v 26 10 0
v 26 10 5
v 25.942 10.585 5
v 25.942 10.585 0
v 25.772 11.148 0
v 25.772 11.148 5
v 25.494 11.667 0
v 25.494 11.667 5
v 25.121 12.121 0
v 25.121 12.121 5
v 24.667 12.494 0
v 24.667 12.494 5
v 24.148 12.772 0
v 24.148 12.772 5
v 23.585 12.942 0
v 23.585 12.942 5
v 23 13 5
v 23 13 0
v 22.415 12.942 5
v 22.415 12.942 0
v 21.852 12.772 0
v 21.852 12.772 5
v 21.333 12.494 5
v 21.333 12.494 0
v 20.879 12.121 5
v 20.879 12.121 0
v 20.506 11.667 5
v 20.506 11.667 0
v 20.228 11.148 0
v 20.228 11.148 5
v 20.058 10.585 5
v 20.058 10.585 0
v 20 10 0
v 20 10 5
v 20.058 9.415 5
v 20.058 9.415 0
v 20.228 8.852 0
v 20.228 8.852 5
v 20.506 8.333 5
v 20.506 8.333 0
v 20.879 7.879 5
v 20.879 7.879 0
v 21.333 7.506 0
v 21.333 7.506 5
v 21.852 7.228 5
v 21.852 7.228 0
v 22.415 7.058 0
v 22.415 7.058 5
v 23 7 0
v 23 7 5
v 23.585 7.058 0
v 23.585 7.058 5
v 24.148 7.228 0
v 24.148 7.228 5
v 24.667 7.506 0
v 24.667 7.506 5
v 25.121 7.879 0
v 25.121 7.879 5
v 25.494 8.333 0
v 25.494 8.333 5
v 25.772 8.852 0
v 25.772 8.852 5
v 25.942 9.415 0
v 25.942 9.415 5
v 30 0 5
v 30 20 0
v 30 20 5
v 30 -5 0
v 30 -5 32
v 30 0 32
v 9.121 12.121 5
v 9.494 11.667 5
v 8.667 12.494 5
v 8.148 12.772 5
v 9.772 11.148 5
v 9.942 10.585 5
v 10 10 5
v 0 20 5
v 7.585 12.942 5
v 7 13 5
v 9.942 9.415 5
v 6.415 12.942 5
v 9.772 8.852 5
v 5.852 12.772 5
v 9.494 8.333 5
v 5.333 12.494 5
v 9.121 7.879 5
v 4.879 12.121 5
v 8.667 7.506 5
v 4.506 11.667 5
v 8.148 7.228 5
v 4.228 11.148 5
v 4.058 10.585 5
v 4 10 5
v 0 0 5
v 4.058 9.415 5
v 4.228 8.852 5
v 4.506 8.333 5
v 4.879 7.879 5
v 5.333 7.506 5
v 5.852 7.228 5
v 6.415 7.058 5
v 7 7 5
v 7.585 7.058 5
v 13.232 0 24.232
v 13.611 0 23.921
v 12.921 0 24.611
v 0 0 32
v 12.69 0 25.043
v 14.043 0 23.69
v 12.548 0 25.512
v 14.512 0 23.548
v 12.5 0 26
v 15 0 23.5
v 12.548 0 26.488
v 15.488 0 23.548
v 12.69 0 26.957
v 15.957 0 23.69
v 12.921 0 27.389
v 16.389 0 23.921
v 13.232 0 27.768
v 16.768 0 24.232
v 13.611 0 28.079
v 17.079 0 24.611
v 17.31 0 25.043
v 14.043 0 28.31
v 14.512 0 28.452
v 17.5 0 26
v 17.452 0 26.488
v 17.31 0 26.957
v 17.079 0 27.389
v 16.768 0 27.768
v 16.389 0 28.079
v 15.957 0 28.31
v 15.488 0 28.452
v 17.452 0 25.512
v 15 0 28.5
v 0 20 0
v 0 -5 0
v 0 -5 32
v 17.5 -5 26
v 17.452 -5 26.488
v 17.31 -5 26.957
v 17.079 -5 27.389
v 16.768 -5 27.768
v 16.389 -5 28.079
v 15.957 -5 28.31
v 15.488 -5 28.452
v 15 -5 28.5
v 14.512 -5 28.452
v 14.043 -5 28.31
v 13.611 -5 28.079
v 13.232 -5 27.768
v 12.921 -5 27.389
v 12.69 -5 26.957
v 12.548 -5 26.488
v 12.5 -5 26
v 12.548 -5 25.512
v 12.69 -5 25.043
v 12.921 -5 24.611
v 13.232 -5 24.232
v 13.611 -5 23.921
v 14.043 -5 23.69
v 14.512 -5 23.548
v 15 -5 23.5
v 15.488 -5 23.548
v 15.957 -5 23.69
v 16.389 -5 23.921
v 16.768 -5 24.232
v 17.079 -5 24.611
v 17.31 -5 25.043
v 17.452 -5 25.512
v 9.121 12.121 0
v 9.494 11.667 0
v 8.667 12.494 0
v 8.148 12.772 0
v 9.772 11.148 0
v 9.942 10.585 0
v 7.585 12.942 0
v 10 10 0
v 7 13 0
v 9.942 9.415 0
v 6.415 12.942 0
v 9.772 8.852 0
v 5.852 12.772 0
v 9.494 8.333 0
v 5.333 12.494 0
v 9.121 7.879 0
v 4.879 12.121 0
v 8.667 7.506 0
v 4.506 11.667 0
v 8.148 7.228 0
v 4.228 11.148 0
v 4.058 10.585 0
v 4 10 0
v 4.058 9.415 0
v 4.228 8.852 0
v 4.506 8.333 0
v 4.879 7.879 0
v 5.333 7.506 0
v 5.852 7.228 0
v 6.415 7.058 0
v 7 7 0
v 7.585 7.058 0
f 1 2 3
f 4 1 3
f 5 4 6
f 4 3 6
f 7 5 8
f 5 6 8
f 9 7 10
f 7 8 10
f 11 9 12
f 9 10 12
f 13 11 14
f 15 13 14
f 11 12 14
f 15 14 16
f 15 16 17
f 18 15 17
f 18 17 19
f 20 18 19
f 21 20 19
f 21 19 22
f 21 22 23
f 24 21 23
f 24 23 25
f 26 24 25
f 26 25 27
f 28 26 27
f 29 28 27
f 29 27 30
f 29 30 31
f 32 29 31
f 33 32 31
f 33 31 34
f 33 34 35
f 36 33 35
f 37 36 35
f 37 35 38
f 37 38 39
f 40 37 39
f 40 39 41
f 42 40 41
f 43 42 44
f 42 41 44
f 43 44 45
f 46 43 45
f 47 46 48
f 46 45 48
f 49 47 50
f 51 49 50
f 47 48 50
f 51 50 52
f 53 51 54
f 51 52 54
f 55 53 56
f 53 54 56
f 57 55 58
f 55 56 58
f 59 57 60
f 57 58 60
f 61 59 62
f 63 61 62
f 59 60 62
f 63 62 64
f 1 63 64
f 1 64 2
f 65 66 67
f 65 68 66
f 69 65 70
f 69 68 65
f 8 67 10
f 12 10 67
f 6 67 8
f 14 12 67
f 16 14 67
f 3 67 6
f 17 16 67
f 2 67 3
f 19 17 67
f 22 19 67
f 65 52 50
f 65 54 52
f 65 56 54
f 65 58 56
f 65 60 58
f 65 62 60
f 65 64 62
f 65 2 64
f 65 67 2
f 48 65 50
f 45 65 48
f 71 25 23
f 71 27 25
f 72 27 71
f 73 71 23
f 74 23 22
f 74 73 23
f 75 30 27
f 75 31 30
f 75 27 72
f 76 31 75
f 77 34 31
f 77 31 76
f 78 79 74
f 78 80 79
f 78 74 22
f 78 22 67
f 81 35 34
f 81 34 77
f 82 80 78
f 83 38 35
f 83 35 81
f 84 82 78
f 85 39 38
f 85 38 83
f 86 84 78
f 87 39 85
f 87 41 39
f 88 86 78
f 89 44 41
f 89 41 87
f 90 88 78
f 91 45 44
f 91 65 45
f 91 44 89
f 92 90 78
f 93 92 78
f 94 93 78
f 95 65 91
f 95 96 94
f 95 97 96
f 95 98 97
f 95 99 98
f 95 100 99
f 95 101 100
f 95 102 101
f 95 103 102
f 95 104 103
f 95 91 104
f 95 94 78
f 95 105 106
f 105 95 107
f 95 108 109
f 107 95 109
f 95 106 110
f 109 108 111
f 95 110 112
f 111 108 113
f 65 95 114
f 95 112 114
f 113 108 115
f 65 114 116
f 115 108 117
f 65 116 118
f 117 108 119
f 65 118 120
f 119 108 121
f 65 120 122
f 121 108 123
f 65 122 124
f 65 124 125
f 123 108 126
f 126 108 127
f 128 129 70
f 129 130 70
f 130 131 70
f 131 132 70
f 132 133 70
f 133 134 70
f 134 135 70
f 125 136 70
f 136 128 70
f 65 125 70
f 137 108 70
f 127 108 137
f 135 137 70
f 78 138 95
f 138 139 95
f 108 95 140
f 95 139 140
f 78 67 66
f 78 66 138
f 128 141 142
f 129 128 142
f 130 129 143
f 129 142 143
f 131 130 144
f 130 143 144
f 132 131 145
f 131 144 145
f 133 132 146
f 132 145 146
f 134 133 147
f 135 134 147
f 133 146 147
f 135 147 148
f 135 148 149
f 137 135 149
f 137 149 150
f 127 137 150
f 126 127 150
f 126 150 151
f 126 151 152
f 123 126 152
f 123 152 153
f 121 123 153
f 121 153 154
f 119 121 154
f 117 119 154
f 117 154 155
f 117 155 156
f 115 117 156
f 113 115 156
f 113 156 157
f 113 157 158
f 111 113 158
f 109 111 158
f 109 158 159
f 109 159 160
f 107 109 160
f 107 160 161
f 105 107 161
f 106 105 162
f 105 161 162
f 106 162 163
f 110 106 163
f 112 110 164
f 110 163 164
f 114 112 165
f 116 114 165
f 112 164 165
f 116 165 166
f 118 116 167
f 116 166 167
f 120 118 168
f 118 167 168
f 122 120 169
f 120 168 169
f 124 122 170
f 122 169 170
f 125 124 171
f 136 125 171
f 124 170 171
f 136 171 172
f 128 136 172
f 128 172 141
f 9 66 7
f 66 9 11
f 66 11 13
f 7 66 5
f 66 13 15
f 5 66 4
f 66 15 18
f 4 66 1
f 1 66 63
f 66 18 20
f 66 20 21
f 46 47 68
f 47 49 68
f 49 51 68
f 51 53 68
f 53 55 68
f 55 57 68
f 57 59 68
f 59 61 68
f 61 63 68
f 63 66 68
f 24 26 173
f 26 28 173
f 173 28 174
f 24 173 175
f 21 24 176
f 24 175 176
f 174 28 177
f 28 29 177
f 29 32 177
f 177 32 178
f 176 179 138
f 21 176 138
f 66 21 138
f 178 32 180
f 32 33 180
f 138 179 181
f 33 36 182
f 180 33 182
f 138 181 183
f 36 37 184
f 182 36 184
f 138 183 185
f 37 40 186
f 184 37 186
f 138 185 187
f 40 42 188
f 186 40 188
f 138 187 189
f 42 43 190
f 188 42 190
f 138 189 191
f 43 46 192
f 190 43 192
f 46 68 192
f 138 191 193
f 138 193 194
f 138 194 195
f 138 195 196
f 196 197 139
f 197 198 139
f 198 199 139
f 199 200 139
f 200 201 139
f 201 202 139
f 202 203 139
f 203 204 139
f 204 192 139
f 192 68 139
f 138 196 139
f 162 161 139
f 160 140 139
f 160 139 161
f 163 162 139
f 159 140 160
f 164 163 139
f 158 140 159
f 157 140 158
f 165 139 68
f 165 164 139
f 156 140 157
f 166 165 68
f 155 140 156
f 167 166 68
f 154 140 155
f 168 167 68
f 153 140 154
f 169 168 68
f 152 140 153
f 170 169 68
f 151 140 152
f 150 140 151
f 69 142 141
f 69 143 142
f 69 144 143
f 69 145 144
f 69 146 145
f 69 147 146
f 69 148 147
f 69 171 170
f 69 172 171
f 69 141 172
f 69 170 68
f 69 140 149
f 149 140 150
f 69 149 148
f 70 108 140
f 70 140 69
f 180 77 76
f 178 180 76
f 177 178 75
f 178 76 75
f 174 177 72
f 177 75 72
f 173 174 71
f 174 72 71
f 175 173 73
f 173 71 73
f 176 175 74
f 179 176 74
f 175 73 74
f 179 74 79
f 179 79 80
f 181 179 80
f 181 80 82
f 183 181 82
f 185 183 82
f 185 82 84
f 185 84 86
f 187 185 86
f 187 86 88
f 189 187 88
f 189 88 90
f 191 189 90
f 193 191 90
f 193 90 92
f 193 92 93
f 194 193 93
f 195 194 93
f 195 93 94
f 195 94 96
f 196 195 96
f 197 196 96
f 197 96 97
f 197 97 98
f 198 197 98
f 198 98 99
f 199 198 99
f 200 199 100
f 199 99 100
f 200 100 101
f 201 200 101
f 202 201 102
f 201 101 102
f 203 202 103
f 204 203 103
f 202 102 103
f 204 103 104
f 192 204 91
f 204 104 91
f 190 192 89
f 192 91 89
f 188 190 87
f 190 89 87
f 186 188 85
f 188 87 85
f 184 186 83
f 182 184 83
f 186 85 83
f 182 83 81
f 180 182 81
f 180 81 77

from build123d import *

# Parameters (mm, degrees)
F0_W     = 30
F0_H     = 32
F1_DEPTH = 5
F2_W     = 30
F2_H     = 5
F3_DEPTH = 20
F4_R     = 3
F5_DEPTH = 25
F6_R     = 2.5
F7_DEPTH = 25


with BuildPart() as f1:
    # F0 (on Front) → F1 (new body)
    with BuildSketch(Plane.XZ):
        with Locations((15, 16)):
            Rectangle(F0_W, F0_H)
    extrude(amount=F1_DEPTH)

    # F2 (on face) → F3 (join)
    with BuildSketch(Plane(origin=(0, 0, 0), x_dir=(-1, 0, 0), z_dir=(0, 1, 0))):
        with Locations((-15, 2.5)):
            Rectangle(F2_W, F2_H)
    extrude(amount=F3_DEPTH)

    # F4 (on face) → F5 (cut)
    with BuildSketch(Plane.XY.offset(5)):
        with Locations((23, 10)):
            Circle(F4_R)
        with Locations((7, 10)):
            Circle(F4_R)
    extrude(amount=-F5_DEPTH, mode=Mode.SUBTRACT)

    # F6 (on face) → F7 (cut)
    with BuildSketch(Plane.XZ.offset(5)):
        with Locations((15, 26)):
            Circle(F6_R)
    extrude(amount=-F7_DEPTH, mode=Mode.SUBTRACT)


solid = f1.part
